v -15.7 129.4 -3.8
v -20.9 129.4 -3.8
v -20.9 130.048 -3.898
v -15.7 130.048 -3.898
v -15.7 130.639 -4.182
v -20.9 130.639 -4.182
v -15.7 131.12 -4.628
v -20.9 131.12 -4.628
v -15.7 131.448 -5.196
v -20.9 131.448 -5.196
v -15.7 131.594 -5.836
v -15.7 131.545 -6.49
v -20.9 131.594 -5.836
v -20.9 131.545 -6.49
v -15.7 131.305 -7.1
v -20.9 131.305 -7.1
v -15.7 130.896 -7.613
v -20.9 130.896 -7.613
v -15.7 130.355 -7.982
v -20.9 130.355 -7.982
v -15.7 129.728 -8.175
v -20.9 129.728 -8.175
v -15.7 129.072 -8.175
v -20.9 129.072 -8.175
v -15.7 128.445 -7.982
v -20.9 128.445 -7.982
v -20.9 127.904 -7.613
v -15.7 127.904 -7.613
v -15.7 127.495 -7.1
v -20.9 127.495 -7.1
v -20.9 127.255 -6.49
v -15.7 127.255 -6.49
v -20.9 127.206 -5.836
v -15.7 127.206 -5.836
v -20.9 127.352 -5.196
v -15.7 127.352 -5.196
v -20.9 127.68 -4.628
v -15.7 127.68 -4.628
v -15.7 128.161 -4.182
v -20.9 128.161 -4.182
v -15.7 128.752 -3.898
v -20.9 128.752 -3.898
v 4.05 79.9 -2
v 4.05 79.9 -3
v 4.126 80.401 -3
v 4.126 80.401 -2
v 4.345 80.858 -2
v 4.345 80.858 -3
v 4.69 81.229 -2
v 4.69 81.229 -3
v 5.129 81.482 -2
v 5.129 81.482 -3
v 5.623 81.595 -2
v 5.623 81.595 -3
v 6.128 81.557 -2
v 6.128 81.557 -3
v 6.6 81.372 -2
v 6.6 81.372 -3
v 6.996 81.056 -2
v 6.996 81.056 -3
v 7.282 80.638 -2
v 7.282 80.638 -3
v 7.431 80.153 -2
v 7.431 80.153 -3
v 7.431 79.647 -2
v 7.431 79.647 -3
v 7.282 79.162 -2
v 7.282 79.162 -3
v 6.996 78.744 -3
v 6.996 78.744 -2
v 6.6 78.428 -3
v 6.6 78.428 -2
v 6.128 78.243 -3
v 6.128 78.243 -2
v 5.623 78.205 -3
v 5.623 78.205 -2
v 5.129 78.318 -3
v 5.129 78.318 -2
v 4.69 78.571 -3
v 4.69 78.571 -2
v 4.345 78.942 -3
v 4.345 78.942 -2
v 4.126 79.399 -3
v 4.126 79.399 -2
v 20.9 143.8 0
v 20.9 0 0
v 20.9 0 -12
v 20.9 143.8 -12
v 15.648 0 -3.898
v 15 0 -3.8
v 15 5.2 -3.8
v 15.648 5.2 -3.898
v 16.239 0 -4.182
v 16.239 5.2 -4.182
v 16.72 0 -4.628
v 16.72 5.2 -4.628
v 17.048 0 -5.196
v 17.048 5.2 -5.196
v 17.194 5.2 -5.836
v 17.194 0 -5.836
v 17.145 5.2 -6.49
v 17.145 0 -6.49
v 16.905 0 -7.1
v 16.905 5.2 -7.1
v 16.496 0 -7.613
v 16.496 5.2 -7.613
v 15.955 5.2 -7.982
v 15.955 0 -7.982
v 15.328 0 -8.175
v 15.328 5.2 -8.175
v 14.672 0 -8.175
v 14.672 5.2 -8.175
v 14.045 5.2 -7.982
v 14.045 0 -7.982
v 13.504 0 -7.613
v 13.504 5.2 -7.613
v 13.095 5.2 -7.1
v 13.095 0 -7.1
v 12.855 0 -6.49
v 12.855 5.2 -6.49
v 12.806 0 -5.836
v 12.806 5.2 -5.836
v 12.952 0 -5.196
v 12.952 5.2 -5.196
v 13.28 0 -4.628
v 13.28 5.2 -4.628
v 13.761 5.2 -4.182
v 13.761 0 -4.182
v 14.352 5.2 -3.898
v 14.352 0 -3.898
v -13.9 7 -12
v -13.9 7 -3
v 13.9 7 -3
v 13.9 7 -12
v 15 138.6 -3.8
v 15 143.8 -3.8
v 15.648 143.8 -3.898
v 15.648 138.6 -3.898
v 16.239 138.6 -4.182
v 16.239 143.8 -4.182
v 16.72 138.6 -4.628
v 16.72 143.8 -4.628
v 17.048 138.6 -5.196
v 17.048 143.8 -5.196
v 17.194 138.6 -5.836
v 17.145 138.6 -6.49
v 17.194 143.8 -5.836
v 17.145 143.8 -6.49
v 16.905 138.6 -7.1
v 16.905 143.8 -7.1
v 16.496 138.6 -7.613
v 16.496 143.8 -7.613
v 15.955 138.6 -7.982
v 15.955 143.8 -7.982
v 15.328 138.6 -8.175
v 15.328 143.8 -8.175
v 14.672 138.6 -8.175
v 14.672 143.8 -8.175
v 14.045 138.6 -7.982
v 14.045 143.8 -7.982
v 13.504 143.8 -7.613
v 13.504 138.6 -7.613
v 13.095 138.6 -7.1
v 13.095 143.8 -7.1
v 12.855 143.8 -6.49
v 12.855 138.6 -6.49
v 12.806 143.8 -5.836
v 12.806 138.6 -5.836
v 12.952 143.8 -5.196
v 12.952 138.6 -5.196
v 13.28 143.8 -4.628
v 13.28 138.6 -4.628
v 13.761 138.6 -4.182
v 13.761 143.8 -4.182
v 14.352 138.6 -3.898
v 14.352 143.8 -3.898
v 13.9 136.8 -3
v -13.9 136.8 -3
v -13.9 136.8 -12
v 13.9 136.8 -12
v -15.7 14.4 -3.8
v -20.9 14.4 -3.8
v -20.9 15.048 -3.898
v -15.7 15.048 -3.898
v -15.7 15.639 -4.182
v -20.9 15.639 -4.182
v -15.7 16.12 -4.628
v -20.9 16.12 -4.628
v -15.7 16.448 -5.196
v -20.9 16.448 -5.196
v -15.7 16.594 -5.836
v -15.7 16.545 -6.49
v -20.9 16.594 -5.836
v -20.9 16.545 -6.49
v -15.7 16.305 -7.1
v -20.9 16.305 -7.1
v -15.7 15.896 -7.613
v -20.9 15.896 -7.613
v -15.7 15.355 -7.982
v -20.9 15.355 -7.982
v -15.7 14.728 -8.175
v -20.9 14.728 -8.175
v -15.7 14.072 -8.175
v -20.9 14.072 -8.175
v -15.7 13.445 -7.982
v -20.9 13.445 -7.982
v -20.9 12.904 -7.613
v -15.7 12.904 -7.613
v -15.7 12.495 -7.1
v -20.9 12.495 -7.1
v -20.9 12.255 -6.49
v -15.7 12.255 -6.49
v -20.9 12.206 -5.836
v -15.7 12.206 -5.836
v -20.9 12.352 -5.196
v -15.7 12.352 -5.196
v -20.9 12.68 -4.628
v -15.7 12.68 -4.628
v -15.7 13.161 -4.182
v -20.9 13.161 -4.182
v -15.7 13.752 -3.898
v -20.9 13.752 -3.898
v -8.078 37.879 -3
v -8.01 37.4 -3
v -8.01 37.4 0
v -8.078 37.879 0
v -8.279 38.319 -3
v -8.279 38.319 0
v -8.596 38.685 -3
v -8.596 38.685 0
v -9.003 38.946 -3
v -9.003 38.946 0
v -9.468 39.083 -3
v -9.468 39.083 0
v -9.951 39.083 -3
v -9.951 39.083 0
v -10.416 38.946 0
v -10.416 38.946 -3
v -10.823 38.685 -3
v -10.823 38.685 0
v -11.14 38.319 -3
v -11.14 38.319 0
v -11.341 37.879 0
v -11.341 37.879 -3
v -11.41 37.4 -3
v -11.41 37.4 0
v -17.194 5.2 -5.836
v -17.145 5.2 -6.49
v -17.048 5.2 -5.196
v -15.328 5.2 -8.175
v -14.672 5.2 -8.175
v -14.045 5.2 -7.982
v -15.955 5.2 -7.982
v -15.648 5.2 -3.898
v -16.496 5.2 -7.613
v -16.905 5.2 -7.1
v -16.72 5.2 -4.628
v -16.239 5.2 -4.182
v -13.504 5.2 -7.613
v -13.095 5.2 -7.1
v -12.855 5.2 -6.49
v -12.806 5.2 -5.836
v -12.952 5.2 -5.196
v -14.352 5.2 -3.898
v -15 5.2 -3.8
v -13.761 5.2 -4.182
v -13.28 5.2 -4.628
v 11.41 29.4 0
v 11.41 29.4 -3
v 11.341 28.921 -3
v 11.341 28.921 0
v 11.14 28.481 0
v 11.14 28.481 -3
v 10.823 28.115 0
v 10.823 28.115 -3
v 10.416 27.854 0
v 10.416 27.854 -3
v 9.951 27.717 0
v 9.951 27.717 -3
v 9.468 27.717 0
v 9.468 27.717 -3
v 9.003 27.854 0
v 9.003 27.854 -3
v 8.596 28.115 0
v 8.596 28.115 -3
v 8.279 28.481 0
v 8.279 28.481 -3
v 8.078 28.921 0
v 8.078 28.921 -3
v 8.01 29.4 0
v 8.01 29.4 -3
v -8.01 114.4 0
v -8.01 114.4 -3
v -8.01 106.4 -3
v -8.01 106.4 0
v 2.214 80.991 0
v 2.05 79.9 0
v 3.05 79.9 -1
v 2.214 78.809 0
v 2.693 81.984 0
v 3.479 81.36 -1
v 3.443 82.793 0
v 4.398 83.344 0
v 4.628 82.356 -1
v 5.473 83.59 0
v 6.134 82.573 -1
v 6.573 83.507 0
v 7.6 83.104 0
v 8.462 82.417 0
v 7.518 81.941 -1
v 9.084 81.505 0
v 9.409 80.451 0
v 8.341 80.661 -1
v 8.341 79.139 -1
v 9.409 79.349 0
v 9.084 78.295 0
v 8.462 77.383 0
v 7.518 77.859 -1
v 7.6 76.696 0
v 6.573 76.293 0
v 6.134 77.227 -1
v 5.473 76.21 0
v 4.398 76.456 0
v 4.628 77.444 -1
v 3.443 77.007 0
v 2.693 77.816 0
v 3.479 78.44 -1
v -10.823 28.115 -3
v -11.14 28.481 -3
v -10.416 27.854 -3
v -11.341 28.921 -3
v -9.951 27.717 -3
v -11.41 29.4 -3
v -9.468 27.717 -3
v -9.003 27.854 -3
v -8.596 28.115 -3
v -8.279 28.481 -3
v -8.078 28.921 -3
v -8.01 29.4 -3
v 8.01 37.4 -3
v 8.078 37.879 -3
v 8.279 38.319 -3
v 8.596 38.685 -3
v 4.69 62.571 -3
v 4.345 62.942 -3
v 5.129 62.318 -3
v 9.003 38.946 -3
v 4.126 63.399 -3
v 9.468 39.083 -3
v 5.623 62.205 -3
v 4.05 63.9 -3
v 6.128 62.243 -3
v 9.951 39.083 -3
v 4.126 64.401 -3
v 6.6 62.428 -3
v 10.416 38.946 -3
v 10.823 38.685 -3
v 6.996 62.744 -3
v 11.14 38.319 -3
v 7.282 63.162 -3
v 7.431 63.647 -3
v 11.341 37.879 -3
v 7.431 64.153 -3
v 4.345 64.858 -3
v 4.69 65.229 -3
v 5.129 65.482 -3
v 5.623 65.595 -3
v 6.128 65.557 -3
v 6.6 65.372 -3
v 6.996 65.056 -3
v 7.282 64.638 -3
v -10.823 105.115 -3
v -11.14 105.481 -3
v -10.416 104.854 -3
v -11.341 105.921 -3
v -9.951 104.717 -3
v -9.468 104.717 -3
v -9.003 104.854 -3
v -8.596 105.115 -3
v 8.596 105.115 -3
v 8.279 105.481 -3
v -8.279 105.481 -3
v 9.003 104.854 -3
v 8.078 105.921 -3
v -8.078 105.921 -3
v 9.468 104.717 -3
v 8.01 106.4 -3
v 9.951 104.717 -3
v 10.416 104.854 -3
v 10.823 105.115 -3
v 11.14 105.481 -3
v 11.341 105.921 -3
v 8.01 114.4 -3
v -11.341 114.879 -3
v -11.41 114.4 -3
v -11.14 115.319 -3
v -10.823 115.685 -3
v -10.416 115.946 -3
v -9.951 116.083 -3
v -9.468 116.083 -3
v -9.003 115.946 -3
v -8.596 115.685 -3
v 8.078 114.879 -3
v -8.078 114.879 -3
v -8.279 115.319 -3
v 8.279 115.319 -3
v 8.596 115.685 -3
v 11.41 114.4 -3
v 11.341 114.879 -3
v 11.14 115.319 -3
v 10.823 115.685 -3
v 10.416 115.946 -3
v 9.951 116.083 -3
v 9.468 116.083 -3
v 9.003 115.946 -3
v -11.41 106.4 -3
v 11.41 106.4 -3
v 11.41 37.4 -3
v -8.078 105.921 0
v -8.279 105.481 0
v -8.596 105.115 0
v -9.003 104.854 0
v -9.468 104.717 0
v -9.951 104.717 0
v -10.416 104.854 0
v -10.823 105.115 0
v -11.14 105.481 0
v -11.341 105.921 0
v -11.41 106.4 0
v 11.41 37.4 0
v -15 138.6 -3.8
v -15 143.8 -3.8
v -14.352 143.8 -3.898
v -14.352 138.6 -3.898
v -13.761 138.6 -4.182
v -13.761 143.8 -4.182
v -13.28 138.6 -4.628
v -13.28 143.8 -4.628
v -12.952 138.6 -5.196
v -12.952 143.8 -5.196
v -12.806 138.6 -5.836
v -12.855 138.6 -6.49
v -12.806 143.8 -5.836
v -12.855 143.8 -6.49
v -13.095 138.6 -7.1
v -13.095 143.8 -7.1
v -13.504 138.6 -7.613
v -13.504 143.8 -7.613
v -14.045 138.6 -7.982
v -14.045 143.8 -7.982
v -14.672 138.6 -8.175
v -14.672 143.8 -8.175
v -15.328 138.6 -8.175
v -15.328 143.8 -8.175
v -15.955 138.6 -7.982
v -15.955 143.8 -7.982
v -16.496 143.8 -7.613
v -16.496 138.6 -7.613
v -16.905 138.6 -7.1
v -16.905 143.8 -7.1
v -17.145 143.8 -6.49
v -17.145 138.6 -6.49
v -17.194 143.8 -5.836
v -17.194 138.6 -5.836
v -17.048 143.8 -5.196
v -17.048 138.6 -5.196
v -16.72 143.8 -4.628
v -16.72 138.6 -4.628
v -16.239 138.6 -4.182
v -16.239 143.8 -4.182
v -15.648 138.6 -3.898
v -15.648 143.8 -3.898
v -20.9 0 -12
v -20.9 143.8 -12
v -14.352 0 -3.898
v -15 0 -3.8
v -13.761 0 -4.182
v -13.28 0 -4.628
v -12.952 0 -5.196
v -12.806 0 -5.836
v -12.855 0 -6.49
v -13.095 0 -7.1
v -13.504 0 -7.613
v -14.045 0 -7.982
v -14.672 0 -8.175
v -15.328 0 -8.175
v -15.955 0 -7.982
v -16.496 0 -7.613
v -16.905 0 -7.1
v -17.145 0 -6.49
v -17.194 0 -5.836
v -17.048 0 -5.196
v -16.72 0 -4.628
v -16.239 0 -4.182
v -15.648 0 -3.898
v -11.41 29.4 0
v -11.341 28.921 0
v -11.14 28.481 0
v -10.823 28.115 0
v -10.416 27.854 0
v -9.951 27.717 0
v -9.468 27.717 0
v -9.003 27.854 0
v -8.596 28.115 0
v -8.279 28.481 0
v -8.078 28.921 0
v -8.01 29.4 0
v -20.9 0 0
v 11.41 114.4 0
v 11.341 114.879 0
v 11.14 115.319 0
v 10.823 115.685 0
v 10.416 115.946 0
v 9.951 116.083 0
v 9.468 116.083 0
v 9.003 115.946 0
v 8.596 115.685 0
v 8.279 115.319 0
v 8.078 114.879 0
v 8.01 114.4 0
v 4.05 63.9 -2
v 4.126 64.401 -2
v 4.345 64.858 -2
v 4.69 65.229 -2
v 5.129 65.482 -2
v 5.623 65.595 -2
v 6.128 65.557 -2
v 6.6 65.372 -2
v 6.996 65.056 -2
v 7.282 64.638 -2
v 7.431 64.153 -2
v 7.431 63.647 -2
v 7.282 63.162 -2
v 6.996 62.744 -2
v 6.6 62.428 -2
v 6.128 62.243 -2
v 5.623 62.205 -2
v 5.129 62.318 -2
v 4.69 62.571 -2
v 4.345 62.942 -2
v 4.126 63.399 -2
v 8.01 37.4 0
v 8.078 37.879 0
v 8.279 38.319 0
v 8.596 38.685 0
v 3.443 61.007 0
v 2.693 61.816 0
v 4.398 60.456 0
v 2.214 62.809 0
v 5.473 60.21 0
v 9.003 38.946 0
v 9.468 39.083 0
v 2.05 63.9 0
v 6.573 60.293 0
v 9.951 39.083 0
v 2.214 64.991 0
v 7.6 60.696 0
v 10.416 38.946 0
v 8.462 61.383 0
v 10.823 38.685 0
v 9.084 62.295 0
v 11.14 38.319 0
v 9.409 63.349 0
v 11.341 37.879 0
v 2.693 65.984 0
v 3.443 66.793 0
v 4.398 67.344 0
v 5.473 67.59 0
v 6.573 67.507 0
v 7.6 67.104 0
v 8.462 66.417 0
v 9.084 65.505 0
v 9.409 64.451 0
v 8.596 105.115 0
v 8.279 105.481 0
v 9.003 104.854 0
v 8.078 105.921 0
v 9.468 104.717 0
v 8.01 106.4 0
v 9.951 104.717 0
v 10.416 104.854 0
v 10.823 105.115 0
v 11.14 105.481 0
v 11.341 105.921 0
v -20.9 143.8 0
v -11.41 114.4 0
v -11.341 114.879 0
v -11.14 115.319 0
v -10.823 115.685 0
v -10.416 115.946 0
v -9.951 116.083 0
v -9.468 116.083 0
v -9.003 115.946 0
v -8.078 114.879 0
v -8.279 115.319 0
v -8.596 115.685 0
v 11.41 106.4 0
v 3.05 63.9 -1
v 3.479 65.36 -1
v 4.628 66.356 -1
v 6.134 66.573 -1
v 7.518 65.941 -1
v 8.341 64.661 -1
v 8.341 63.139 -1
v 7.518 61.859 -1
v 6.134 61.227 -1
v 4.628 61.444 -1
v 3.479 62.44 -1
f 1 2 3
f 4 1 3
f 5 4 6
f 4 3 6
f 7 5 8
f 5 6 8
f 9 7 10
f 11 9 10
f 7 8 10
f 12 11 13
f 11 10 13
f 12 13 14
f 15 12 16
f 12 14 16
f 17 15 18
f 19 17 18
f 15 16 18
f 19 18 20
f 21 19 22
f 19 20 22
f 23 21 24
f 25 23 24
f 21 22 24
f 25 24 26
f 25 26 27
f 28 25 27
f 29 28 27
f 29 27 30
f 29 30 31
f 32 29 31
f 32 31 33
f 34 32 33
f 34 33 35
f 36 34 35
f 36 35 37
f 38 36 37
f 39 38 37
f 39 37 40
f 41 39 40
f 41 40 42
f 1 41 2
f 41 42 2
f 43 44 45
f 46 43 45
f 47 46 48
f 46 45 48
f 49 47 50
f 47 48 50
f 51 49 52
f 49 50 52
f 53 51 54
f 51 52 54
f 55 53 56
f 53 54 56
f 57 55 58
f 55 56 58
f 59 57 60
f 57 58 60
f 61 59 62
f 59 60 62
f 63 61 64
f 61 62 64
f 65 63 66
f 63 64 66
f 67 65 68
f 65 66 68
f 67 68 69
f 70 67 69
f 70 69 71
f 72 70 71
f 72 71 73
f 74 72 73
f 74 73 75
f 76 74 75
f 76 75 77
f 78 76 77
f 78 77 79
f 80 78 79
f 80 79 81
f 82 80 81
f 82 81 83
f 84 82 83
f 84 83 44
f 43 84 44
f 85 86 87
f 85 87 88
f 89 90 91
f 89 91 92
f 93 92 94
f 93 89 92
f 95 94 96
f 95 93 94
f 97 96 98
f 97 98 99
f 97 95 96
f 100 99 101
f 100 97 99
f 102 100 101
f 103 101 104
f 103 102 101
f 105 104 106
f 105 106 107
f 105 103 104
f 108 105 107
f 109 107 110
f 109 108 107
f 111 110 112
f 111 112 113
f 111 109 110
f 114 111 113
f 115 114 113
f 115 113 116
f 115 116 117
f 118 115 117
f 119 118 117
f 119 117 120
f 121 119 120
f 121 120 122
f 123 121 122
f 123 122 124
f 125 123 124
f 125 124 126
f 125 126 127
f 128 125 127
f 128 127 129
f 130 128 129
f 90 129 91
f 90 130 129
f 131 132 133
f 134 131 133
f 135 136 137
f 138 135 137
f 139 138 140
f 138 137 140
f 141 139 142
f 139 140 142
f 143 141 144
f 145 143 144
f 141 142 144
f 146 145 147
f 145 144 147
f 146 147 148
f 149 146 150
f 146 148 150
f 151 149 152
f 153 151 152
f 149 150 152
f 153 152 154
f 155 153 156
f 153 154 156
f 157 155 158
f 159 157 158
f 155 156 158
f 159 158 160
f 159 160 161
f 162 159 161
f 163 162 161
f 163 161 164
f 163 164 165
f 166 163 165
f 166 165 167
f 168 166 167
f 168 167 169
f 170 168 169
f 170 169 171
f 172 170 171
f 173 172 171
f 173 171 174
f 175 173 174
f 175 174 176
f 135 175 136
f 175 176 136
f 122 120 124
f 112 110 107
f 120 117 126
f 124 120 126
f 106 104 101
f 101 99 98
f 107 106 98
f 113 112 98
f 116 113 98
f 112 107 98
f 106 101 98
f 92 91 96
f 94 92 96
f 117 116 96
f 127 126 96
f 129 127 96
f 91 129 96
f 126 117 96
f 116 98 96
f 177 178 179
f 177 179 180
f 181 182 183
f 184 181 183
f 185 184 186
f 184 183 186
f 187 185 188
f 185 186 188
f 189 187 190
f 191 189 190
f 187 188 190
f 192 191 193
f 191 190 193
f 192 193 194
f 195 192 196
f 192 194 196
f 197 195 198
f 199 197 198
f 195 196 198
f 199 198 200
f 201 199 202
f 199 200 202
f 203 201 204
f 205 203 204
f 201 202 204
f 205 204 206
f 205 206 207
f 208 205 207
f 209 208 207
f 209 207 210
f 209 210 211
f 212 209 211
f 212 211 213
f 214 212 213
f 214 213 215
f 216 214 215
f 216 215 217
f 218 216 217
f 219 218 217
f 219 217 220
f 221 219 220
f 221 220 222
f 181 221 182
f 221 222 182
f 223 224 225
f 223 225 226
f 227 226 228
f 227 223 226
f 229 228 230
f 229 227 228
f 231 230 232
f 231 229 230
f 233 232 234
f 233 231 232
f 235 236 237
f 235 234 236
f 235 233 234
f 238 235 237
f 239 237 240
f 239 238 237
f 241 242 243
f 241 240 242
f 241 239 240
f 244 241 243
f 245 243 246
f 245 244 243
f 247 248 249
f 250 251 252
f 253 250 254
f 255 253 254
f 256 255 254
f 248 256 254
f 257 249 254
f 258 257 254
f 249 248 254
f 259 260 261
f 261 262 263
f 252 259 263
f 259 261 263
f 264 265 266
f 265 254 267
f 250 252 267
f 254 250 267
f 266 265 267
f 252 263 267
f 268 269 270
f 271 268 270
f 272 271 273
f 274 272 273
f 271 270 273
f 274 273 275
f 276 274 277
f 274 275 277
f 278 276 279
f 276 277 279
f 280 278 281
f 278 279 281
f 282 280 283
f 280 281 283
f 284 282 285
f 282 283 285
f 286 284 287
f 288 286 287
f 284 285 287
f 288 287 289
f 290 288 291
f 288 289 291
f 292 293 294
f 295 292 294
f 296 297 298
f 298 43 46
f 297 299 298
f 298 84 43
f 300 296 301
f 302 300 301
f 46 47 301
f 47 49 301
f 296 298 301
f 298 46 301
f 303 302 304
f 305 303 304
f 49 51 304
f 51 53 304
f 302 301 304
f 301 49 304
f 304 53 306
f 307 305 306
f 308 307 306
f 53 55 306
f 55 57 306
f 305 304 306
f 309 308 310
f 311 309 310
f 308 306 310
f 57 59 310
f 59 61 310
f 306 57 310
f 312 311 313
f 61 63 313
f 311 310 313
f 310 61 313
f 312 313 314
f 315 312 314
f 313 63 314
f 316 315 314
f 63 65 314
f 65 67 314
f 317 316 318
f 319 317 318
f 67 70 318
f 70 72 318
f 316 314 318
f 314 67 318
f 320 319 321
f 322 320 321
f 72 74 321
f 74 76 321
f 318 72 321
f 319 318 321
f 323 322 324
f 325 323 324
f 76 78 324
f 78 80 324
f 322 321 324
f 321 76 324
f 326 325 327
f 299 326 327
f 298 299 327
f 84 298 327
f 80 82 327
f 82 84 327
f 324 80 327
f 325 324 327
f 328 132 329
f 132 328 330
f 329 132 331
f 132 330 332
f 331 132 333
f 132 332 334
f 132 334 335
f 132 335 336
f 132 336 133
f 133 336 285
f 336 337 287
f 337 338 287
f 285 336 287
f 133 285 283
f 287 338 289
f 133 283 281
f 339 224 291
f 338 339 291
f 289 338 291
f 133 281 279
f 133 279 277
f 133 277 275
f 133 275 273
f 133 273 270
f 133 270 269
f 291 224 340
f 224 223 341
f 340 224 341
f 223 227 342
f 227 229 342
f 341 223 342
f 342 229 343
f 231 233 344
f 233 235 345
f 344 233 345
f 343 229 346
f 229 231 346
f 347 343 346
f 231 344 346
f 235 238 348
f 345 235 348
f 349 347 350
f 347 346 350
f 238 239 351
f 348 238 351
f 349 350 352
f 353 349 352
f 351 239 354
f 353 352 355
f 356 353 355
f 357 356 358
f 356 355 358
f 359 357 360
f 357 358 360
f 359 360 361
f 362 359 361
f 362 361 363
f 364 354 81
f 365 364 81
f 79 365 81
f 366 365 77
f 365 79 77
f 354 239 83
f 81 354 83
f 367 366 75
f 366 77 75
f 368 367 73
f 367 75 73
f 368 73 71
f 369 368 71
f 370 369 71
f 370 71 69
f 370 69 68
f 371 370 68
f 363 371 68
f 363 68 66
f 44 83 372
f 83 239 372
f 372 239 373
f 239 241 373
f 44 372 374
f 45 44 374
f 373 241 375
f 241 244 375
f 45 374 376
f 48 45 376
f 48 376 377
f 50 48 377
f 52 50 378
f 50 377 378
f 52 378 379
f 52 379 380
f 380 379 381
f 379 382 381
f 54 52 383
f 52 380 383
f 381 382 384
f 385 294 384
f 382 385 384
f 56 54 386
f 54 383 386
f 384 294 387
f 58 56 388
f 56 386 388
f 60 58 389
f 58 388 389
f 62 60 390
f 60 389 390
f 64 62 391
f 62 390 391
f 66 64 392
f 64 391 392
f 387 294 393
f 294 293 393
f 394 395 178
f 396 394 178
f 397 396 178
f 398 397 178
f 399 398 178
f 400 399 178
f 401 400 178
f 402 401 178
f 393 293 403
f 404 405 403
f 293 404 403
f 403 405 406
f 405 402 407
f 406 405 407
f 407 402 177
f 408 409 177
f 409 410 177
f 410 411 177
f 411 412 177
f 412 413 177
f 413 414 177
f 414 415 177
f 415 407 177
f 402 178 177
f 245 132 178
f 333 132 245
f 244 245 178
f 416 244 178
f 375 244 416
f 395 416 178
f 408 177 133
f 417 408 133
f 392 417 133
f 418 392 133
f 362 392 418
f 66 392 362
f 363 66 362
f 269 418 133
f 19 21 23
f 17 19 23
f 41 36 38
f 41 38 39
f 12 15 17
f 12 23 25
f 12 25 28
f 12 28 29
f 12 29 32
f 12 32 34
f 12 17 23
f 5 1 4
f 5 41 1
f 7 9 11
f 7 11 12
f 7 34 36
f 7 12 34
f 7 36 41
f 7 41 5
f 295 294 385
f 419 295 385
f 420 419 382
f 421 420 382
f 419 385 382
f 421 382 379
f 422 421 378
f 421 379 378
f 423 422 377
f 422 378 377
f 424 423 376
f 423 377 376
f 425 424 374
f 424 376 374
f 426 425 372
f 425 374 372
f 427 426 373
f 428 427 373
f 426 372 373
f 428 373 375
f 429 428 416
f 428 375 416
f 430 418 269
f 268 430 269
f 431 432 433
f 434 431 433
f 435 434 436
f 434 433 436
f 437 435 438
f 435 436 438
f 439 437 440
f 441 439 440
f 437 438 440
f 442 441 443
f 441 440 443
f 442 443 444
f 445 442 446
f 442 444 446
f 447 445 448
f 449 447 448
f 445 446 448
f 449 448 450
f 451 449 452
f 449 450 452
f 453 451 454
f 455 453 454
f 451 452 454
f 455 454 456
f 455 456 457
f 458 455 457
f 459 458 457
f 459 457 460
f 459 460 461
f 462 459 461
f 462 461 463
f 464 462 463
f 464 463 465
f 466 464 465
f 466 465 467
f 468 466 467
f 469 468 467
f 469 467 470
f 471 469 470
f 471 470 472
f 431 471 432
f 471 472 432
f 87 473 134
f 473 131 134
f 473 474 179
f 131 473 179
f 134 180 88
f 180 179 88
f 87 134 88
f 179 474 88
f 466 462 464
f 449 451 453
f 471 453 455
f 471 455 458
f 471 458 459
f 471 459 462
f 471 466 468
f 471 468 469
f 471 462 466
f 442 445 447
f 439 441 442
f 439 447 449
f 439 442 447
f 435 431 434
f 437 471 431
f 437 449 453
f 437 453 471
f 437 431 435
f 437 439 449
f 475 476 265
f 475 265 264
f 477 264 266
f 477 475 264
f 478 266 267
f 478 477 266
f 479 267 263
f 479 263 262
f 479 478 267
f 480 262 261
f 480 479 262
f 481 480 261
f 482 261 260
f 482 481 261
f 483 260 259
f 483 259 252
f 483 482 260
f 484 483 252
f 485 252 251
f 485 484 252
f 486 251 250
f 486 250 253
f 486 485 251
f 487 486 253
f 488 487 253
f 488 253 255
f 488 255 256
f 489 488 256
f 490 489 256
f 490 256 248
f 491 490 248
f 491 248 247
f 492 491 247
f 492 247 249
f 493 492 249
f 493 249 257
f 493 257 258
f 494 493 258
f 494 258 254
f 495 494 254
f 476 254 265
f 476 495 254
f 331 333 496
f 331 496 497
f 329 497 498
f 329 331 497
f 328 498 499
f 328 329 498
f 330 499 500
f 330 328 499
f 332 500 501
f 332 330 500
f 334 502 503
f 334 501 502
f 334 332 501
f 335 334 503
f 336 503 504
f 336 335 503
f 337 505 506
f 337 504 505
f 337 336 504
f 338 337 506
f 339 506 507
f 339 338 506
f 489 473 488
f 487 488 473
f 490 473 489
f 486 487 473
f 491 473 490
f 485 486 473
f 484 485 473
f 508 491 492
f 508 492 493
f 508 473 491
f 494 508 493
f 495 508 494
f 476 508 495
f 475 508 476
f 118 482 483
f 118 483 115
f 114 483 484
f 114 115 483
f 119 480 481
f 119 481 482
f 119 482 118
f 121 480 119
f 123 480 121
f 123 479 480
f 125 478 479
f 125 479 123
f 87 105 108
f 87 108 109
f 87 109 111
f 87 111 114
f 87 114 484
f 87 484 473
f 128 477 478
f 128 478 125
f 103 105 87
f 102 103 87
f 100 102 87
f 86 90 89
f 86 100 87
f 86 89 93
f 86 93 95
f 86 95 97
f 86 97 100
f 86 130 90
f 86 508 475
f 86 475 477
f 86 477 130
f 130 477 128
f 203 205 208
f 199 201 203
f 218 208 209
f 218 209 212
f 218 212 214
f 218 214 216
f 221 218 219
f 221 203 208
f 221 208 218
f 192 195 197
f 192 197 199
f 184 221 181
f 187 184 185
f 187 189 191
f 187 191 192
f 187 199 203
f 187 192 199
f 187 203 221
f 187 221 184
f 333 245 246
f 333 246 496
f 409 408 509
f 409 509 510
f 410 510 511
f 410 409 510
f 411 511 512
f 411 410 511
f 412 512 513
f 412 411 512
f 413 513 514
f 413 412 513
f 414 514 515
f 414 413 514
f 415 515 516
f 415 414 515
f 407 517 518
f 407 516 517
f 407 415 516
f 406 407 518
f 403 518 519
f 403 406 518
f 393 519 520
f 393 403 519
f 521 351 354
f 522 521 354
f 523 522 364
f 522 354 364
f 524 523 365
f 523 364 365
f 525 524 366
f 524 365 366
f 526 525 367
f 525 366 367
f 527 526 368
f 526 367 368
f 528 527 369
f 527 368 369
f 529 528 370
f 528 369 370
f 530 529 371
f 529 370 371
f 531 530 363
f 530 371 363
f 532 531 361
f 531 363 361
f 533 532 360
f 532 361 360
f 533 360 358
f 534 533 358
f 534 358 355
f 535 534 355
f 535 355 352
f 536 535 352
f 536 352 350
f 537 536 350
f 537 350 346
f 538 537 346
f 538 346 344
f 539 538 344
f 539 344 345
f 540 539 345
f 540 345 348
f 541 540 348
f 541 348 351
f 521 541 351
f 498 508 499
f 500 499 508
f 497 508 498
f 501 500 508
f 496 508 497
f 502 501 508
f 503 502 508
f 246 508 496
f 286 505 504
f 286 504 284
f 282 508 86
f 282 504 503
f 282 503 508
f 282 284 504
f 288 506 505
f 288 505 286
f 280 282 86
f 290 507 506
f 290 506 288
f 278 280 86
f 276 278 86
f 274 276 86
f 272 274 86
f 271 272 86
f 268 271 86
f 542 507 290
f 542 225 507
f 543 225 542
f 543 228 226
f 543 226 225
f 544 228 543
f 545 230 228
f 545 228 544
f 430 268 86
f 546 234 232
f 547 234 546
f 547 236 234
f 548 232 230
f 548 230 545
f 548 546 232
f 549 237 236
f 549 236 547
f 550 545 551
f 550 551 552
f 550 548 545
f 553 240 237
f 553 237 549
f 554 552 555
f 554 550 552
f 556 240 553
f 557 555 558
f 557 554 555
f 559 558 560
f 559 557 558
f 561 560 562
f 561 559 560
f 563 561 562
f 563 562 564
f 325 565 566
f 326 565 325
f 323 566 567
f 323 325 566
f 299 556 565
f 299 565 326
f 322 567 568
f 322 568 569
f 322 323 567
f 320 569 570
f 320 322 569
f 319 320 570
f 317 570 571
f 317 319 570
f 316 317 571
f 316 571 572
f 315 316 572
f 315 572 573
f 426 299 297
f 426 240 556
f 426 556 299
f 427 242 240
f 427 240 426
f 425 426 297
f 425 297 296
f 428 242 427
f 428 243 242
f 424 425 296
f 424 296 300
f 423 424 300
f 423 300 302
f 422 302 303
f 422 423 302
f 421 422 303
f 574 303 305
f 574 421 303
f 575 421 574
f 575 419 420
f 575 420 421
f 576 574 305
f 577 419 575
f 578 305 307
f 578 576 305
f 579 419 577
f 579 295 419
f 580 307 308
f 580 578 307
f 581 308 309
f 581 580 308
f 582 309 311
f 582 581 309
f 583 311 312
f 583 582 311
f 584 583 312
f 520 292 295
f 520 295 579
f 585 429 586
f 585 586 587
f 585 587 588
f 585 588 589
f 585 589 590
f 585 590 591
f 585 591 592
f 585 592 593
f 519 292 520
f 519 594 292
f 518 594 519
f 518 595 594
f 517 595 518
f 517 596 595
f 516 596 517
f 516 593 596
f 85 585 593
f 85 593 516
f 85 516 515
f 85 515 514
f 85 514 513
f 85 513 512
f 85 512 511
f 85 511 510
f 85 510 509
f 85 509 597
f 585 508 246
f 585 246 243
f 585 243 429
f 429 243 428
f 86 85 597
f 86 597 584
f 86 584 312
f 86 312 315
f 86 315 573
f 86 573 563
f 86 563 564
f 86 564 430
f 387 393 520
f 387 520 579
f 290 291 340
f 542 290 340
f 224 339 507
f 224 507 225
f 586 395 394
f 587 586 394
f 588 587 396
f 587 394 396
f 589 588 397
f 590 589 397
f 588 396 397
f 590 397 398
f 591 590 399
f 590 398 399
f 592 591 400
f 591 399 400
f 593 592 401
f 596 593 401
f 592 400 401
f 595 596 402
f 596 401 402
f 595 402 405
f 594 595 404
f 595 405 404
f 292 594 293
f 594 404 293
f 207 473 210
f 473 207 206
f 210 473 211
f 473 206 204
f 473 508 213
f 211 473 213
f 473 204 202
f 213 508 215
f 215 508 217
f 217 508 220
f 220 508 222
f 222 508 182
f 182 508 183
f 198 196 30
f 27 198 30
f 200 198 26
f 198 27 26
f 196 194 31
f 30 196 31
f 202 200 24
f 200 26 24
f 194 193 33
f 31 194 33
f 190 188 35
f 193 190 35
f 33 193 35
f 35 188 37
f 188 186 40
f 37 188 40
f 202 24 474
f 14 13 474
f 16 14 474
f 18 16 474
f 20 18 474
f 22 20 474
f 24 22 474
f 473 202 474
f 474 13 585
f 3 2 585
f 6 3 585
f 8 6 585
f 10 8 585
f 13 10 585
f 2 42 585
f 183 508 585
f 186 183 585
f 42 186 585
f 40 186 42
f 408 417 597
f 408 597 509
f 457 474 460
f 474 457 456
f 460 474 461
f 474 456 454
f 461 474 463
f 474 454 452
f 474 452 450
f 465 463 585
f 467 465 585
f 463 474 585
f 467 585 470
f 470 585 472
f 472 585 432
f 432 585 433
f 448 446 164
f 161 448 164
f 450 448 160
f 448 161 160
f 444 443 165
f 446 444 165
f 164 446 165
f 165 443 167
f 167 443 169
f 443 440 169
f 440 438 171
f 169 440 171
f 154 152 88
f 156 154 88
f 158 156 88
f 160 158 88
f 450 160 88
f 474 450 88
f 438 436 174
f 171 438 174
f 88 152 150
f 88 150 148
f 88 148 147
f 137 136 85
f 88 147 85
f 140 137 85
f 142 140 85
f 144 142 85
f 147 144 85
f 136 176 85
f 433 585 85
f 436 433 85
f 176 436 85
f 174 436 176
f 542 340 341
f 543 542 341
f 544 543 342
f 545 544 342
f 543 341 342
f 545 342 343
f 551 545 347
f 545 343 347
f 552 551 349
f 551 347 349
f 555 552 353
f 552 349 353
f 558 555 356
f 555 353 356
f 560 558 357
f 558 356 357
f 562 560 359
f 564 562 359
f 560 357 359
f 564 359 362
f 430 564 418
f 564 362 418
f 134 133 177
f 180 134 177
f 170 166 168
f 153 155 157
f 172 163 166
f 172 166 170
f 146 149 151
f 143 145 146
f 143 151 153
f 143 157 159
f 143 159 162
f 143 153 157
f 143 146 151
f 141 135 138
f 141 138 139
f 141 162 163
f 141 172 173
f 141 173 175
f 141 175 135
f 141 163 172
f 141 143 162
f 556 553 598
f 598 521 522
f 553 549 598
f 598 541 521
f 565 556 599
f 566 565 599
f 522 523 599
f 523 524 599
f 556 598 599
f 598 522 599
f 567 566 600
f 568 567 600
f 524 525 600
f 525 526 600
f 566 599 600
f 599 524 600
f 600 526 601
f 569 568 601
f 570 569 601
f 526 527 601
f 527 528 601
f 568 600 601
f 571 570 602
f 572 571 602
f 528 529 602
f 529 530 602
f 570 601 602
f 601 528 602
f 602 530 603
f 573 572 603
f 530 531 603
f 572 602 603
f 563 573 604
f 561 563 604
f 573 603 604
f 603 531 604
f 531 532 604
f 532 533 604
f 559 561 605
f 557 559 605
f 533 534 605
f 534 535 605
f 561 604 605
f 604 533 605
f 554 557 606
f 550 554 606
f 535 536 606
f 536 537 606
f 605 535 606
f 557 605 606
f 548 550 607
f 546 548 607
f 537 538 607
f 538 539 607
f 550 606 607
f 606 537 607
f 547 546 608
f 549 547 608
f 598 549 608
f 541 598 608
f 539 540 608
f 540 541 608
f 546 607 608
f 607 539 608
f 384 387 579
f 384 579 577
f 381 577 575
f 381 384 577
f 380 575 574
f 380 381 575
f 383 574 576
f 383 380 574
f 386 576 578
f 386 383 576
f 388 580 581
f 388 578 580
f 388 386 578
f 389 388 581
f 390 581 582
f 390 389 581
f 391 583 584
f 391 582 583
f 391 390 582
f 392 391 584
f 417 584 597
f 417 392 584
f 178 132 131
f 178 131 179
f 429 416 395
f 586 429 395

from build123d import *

# Parameters (mm, degrees)
SKETCH1_W                 = 41.8
SKETCH1_H                 = 143.8
BOSS_EXTRUDE1_DEPTH       = 12
SHELL1_T                  = -7
SHELL1_THICKNESS_2_FACE_W = 27.8
SHELL1_THICKNESS_2_FACE_H = 129.8
SHELL1_THICKNESS_2_DEPTH  = 4
SKETCH2_R                 = 2.2
CUT_EXTRUDE1_DEPTH        = 5.2
SKETCH3_R                 = 2.2
CUT_EXTRUDE2_DEPTH        = 5.2
SKETCH5_R                 = 1.7
CUT_EXTRUDE3_DEPTH        = 10
CHAMFER1_SIZE             = 2
CUT_EXTRUDE4_DEPTH        = 3.5


with BuildPart() as part:
    # Sketch1 → Boss-Extrude1 (new body)
    with BuildSketch(Plane.XY):
        with Locations((0, 71.9)):
            Rectangle(SKETCH1_W, SKETCH1_H)
    extrude(amount=-BOSS_EXTRUDE1_DEPTH)

    # Shell1
    shell1_openings = [part.faces().sort_by_distance(p)[0] for p in [
        (0, 71.9, -12),
    ]]
    offset(amount=SHELL1_T, openings=shell1_openings, kind=Kind.INTERSECTION)

    # Shell1 thickness 2 face (on inner face of the shell) → Shell1 thickness 2 (cut)
    with BuildSketch(Plane(origin=(0, 71.9, -7), x_dir=(1, 0, 0), z_dir=(0, 0, 1))):
        Rectangle(SHELL1_THICKNESS_2_FACE_W, SHELL1_THICKNESS_2_FACE_H)
    extrude(amount=SHELL1_THICKNESS_2_DEPTH, mode=Mode.SUBTRACT)

    # Sketch2 → Cut-Extrude1 (cut)
    with BuildSketch(Plane(origin=(0, 143.8, 0), x_dir=(1, 0, 0), z_dir=(0, 1, 0))):
        with Locations(Location((-15, 6, 0), (0, 0, 270))):
            Circle(SKETCH2_R)
        with Locations(Location((15, 6, 0), (0, 0, 270))):
            Circle(SKETCH2_R)
    cut_extrude1 = extrude(amount=-CUT_EXTRUDE1_DEPTH, mode=Mode.SUBTRACT)

    # Mirror1: Cut-Extrude1 across plane
    add(cut_extrude1.mirror(Plane.ZX.offset(71.9)), mode=Mode.SUBTRACT)

    # Sketch3 → Cut-Extrude2 (cut)
    with BuildSketch(Plane.ZY.offset(20.9)):
        with Locations((-6, 129.4)):
            Circle(SKETCH3_R)
        with Locations((-6, 14.4)):
            Circle(SKETCH3_R)
    extrude(amount=-CUT_EXTRUDE2_DEPTH, mode=Mode.SUBTRACT)

    # Sketch5 → Cut-Extrude3 (cut)
    with BuildSketch(Plane(origin=(0, 0, -3), x_dir=(-1, 0, 0), z_dir=(0, 0, -1))):
        with Locations((-5.75, 63.9)):
            Circle(SKETCH5_R)
        with Locations((-5.75, 79.9)):
            Circle(SKETCH5_R)
    extrude(amount=-CUT_EXTRUDE3_DEPTH, mode=Mode.SUBTRACT)

    # Chamfer1
    chamfer1_edges = [part.edges().sort_by_distance(p)[0] for p in [
        (7.45, 63.9, 0),
        (7.45, 79.9, 0),
    ]]
    chamfer(chamfer1_edges, length=CHAMFER1_SIZE)

    # Sketch6 → Cut-Extrude4 (cut)
    with BuildSketch(Plane(origin=(0, 0, -3), x_dir=(-1, 0, 0), z_dir=(0, 0, -1))):
        with BuildLine():
            Line((11.409552025, 37.4), (11.409552025, 29.4))
            ThreePointArc((11.409552025, 29.4), (9.709552025, 27.7), (8.009552025, 29.4))
            Line((8.009552025, 29.4), (8.009552025, 37.4))
            ThreePointArc((8.009552025, 37.4), (9.709552025, 39.1), (11.409552025, 37.4))
        make_face()
        with BuildLine():
            Line((11.409552025, 106.4), (11.409552025, 114.4))
            ThreePointArc((11.409552025, 114.4), (9.709552025, 116.1), (8.009552025, 114.4))
            Line((8.009552025, 114.4), (8.009552025, 106.4))
            ThreePointArc((8.009552025, 106.4), (9.709552025, 104.7), (11.409552025, 106.4))
        make_face()
        with BuildLine():
            Line((-11.409552025, 106.4), (-11.409552025, 114.4))
            ThreePointArc((-11.409552025, 114.4), (-9.709552025, 116.1), (-8.009552025, 114.4))
            Line((-8.009552025, 114.4), (-8.009552025, 106.4))
            ThreePointArc((-8.009552025, 106.4), (-9.709552025, 104.7), (-11.409552025, 106.4))
        make_face()
        with BuildLine():
            Line((-11.409552025, 37.4), (-11.409552025, 29.4))
            ThreePointArc((-11.409552025, 29.4), (-9.709552025, 27.7), (-8.009552025, 29.4))
            Line((-8.009552025, 29.4), (-8.009552025, 37.4))
            ThreePointArc((-8.009552025, 37.4), (-9.709552025, 39.1), (-11.409552025, 37.4))
        make_face()
    extrude(amount=-CUT_EXTRUDE4_DEPTH, mode=Mode.SUBTRACT)


solid = part.part
